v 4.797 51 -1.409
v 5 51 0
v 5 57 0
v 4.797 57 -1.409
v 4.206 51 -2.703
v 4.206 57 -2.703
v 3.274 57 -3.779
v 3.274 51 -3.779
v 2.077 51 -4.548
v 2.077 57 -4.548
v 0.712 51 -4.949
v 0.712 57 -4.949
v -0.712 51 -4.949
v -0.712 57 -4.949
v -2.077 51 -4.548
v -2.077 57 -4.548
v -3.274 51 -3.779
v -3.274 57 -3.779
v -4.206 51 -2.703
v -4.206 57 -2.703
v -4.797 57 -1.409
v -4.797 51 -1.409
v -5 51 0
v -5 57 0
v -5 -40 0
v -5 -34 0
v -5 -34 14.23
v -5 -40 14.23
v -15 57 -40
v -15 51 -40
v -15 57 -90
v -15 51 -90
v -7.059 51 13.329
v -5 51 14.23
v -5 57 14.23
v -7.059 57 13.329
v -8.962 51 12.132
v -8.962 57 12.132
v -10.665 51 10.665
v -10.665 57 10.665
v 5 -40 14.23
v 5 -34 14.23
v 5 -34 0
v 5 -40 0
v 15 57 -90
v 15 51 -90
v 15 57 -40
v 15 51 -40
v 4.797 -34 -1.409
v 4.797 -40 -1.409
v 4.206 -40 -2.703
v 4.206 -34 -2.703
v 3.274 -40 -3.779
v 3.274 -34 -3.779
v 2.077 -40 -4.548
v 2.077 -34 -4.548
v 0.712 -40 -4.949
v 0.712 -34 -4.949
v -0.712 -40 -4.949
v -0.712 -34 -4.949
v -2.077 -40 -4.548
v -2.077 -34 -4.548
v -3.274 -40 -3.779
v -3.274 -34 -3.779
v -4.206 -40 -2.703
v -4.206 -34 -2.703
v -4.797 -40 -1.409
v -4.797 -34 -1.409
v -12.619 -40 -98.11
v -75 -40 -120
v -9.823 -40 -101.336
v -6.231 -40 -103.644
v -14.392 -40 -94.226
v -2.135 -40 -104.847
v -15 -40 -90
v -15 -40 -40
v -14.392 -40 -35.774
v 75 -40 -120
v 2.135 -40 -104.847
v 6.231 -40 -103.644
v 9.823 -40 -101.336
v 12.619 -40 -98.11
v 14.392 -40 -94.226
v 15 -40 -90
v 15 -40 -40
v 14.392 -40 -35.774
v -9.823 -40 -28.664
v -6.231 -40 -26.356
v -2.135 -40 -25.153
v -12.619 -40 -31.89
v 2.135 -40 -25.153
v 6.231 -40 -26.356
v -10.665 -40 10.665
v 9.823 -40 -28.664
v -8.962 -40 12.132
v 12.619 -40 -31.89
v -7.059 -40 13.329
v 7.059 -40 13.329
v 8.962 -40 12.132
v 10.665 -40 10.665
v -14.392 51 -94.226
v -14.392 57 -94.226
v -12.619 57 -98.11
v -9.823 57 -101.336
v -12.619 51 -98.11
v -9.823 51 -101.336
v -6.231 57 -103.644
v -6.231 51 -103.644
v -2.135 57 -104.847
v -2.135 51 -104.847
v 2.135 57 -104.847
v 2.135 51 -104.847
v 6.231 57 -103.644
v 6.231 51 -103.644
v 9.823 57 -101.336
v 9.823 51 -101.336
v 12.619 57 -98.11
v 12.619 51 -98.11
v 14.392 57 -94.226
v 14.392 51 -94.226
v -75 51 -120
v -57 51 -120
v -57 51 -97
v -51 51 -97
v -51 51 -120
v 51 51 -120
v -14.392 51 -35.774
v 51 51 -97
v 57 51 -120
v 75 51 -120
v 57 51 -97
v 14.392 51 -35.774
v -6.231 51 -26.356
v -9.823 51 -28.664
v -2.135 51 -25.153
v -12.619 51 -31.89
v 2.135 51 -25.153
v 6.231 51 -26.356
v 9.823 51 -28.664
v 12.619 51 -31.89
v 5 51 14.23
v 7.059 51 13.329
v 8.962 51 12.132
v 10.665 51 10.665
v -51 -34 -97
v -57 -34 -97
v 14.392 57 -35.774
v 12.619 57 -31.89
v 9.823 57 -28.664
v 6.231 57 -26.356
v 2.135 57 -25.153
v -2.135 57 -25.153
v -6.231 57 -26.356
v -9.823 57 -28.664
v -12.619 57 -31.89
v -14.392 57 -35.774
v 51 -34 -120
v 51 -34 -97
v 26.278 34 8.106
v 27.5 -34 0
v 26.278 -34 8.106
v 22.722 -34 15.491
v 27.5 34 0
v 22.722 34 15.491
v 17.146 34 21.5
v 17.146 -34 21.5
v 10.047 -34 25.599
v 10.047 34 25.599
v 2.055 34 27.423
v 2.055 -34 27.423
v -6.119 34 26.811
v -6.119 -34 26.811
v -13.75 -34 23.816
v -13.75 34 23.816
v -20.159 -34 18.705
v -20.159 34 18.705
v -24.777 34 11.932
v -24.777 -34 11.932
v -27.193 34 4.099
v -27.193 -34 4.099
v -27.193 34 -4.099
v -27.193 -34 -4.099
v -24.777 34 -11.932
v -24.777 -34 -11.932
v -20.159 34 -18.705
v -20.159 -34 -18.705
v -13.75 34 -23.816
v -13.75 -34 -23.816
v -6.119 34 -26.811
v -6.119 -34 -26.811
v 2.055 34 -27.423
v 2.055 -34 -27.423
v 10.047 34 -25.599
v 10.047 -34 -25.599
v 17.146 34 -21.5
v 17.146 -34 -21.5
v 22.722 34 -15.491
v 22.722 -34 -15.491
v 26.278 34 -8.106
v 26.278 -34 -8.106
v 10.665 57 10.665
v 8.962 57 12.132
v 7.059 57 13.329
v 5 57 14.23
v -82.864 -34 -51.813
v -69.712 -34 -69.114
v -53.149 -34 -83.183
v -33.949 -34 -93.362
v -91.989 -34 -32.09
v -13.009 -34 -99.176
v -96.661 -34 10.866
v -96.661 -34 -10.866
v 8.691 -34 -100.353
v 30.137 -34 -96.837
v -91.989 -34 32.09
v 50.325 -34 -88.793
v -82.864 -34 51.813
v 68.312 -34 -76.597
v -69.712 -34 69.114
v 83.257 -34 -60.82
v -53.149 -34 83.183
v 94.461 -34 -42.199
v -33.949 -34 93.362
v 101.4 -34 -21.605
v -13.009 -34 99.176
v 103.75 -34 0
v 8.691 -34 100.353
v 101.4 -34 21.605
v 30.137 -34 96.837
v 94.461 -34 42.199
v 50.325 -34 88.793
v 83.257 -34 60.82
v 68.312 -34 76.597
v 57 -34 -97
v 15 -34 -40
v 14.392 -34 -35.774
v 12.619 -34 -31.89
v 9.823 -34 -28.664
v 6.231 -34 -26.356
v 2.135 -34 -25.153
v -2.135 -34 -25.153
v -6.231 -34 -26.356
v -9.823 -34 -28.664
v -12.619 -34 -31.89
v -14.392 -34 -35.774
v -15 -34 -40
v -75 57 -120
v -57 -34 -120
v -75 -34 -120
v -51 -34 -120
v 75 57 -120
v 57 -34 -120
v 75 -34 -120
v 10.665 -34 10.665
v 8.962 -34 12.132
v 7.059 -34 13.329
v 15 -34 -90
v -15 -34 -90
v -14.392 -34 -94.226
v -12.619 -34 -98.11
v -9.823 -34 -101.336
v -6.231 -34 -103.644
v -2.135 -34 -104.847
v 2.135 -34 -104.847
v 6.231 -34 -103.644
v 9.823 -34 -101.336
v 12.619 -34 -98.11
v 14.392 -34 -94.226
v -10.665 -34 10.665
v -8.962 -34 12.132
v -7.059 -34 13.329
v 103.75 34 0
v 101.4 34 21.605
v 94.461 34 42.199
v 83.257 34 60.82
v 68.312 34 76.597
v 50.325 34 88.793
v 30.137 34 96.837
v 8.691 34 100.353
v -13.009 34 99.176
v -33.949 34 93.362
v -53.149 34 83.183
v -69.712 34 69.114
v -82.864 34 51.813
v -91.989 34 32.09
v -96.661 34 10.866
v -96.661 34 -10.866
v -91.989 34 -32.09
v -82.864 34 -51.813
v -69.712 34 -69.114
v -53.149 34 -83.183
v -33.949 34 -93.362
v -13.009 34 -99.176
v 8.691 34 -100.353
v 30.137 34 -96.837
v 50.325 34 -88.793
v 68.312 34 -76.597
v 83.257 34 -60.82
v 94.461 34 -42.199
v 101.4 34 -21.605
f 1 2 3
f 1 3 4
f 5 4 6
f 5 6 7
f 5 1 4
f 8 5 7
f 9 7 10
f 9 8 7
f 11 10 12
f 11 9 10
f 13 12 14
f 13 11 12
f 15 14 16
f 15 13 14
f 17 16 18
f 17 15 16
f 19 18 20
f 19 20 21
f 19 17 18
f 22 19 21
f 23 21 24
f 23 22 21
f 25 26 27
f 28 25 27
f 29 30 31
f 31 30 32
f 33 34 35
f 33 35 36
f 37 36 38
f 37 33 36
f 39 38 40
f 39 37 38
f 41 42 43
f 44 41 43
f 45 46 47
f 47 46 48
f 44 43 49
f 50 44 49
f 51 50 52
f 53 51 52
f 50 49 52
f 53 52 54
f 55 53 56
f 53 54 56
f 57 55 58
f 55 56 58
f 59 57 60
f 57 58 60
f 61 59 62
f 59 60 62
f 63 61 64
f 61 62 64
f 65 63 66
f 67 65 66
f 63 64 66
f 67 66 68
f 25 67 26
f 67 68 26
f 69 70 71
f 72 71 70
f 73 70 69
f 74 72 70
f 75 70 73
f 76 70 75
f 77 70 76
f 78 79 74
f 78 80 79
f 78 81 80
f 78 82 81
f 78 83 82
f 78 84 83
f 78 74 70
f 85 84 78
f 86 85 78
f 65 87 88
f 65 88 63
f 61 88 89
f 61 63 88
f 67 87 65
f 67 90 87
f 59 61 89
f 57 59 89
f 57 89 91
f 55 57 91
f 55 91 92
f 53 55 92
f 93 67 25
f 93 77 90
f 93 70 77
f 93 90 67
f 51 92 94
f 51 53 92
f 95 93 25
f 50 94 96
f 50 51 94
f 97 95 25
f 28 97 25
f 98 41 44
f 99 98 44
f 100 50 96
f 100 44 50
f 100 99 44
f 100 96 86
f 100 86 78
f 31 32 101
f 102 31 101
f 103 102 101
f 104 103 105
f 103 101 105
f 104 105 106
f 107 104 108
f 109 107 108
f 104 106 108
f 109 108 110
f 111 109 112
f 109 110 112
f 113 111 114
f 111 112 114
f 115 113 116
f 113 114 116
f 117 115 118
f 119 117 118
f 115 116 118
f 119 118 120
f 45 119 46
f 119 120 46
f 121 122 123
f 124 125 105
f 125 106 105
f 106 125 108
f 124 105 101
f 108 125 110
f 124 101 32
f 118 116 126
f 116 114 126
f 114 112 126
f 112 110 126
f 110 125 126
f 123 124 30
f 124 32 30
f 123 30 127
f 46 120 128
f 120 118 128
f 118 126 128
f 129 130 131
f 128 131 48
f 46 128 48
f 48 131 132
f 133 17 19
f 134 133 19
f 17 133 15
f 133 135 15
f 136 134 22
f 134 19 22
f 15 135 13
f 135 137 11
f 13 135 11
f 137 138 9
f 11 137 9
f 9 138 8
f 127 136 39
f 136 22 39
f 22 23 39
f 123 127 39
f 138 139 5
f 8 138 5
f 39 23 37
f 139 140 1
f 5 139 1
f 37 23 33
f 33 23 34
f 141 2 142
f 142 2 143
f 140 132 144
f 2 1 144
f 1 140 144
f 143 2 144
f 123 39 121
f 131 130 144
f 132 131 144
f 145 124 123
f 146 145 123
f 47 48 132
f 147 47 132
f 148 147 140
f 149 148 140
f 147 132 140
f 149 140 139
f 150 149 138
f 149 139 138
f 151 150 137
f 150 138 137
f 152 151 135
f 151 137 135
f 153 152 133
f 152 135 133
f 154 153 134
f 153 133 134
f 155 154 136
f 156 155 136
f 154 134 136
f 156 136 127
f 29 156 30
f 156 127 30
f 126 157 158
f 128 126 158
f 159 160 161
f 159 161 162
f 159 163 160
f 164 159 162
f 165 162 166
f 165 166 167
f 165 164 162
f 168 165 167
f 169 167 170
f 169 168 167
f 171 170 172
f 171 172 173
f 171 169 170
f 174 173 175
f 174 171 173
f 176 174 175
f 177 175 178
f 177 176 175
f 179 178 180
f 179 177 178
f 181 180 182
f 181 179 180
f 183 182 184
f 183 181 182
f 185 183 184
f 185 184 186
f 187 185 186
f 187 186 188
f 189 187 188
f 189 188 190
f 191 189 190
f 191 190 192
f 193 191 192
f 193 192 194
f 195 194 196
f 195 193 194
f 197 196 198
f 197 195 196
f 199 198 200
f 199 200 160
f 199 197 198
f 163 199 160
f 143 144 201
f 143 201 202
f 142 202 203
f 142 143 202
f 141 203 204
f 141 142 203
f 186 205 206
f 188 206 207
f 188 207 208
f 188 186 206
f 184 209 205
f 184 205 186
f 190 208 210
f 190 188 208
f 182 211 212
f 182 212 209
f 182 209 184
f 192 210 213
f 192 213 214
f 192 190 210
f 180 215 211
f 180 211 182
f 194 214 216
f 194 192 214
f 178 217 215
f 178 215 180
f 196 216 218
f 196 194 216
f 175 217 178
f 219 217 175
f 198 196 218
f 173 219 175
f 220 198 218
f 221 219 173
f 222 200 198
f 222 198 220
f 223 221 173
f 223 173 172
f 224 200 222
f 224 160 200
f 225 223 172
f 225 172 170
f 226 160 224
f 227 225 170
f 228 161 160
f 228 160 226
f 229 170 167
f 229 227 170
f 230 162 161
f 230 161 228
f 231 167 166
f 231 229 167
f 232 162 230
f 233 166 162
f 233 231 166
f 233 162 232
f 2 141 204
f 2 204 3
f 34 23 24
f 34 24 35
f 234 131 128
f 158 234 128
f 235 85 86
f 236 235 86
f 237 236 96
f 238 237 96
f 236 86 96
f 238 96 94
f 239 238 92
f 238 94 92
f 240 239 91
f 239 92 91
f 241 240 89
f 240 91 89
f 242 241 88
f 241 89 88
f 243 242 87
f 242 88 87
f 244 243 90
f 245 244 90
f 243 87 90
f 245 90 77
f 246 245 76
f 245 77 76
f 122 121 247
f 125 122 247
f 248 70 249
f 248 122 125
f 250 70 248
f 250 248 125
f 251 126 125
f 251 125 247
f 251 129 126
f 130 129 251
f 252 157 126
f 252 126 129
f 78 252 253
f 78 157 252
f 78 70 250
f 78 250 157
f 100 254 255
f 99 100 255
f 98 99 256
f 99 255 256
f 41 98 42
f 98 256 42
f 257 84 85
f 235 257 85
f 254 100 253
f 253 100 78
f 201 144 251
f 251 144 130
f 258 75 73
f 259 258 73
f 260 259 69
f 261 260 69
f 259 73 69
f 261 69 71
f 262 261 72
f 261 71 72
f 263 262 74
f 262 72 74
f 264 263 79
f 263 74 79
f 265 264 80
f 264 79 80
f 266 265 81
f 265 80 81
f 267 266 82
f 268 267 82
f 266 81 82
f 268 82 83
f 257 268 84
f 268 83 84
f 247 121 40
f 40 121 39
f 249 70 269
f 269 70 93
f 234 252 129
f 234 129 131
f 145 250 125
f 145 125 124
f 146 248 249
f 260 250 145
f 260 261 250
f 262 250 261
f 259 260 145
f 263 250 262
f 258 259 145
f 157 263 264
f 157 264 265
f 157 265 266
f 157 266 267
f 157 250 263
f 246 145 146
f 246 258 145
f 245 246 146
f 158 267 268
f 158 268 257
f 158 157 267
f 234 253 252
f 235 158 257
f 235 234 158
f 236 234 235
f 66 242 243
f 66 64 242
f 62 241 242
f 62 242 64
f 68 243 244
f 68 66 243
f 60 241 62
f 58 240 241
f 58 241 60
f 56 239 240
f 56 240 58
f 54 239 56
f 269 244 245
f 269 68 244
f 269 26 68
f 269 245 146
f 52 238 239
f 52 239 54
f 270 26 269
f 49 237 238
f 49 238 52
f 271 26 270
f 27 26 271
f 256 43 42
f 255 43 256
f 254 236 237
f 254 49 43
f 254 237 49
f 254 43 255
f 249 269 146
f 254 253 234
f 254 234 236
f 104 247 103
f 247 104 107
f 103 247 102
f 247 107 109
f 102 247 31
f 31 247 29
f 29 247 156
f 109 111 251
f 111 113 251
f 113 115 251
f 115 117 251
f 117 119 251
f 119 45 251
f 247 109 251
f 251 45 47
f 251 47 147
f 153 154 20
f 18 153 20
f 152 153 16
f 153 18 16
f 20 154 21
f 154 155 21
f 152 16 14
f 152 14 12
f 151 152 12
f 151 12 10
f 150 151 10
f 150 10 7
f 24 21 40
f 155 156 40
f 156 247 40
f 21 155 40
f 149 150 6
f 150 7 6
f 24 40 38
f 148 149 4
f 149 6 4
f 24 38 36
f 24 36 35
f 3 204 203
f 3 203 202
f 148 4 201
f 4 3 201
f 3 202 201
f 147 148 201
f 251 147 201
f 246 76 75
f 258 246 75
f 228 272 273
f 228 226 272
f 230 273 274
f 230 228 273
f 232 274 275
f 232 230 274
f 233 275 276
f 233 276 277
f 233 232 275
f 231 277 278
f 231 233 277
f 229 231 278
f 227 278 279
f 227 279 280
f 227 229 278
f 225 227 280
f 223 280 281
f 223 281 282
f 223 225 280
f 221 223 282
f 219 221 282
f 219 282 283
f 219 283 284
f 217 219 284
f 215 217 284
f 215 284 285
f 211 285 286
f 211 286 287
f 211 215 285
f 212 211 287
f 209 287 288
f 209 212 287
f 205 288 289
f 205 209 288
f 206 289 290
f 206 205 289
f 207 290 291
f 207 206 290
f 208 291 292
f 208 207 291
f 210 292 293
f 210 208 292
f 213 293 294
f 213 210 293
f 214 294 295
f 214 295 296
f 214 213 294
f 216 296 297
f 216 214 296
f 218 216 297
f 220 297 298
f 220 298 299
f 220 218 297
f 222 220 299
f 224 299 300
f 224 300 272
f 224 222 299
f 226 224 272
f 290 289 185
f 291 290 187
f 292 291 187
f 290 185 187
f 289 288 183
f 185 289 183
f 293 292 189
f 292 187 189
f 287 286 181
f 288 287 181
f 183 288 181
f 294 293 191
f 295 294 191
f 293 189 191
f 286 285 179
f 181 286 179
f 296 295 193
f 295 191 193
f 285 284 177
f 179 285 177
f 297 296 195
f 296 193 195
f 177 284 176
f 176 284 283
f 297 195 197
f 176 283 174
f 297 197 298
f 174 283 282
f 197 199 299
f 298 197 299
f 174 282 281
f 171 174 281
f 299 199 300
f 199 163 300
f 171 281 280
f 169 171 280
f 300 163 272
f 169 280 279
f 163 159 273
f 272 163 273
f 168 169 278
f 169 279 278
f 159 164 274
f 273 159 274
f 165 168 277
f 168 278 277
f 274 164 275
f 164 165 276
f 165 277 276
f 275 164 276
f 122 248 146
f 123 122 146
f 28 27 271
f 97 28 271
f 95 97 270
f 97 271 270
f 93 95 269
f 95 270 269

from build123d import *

# Parameters (mm, degrees)
F0_R      = 100.5
F0_R_2    = 27.5
F1_DEPTH  = 34
F3_DEPTH  = 6
F4_W      = 150
F4_H      = 6
F5_DEPTH  = 85
F9_DEPTH  = 122
F12_W     = 85
F12_H     = 36.2278819084
F13_DEPTH = 172
F14_W     = 6
F14_H     = 23
F15_DEPTH = 85


# Not quite as in the source:
# - a feature of the source that left no trace in its solid (it failed there, or was rolled back) is left out
# - a feature names something its author has since deleted; it is built from what else it names


with BuildPart() as f1:
    # F0 (on Front) → F1 (new body, symmetric)
    with BuildSketch(Plane.XZ):
        with Locations((3.2501332462, 0)):
            Circle(F0_R)
        Circle(F0_R_2, mode=Mode.SUBTRACT)
    extrude(amount=F1_DEPTH, both=True)


with BuildPart() as f3:
    # F2 (on face) → F3 (new body)
    with BuildSketch(Plane.XZ.offset(34)):
        with BuildLine():
            ThreePointArc((82.7773839779, -61.4464514114), (0.9255990786, -100.4731135225), (-79.0337407783, -57.7028082117))
            Line((-79.0337407783, -57.7028082117), (-141.3309325666, -120))
            Line((-141.3309325666, -120), (141.3309325666, -120))
            Line((141.3309325666, -120), (82.7773839779, -61.4464514114))
        make_face()
        with BuildLine():
            ThreePointArc((26.9250120629, -5.5940794963), (0, -27.5), (-26.9250120629, -5.5940794963))
            Line((-26.9250120629, -5.5940794963), (-79.0337407783, -57.7028082117))
            ThreePointArc((-79.0337407783, -57.7028082117), (0.9255990786, -100.4731135225), (82.7773839779, -61.4464514114))
            Line((82.7773839779, -61.4464514114), (26.9250120629, -5.5940794963))
        make_face()
        with BuildLine():
            Line((-5, 0), (-5, 14.2304020351))
            ThreePointArc((-5, 14.2304020351), (-8.0329882483, 12.7661835285), (-10.6654662833, 10.6654662833))
            Line((-10.6654662833, 10.6654662833), (-26.9250120629, -5.5940794963))
            ThreePointArc((-26.9250120629, -5.5940794963), (0, -27.5), (26.9250120629, -5.5940794963))
            Line((26.9250120629, -5.5940794963), (10.6654662833, 10.6654662833))
            ThreePointArc((10.6654662833, 10.6654662833), (8.0329882483, 12.7661835285), (5, 14.2304020351))
            Line((5, 14.2304020351), (5, 0))
            ThreePointArc((5, 0), (0, -5), (-5, 0))
        make_face()
    extrude(amount=F3_DEPTH)

    # F4 (on face) → F5 (join)
    with BuildSketch(Plane(origin=(0, -34, 0), x_dir=(-1, 0, 0), z_dir=(0, 1, 0))):
        with Locations((0, -117)):
            Rectangle(F4_W, F4_H)
    extrude(amount=F5_DEPTH)

    # F7: F3 across plane


with BuildPart() as f3_1:
    add(f3.part)
    add(f3.part.mirror(Plane(origin=(0, 8.5, -94.3962931942), x_dir=(-1, 0, 0), z_dir=(0, 1, 0))))

    # F8 (on face) → F9 (cut)
    with BuildSketch(Plane.XZ.offset(40)):
        Polygon((-141.3309325666, -120), (-75, -120), (-75, -54.6672668584), (-75, -53.6690674334), align=None)
        Polygon((75, -53.6690674334), (75, -120), (141.3309325666, -120), align=None)
        with BuildLine():
            Line((15, -90), (15, -40))
            ThreePointArc((15, -40), (0, -25), (-15, -40))
            Line((-15, -40), (-15, -90))
            ThreePointArc((-15, -90), (0, -105), (15, -90))
        make_face()
        Polygon((-75, -54.6672668584), (-75, -120), (-10.6654662833, 10.6654662833), (-75, -53.6690674334), align=None)
        Polygon((10.6654662833, 10.6654662833), (75, -120), (75, -53.6690674334), align=None)
    extrude(amount=-F9_DEPTH, mode=Mode.SUBTRACT)

    # F12 (on Right) → F13 (cut, symmetric)
    with BuildSketch(Plane.YZ):
        with Locations((8.5, -122.3534047604)):
            Rectangle(F12_W, F12_H)
    extrude(amount=F13_DEPTH, both=True, mode=Mode.SUBTRACT)

    # F14 (on face) → F15 (join, through all)
    with BuildSketch(Plane(origin=(0, -34, 0), x_dir=(-1, 0, 0), z_dir=(0, 1, 0))):
        with Locations((-54, -108.5)):
            Rectangle(F14_W, F14_H)
        with Locations((54, -108.5)):
            Rectangle(F14_W, F14_H)
    extrude(amount=F15_DEPTH)


solid = Compound([f1.part, f3_1.part])
